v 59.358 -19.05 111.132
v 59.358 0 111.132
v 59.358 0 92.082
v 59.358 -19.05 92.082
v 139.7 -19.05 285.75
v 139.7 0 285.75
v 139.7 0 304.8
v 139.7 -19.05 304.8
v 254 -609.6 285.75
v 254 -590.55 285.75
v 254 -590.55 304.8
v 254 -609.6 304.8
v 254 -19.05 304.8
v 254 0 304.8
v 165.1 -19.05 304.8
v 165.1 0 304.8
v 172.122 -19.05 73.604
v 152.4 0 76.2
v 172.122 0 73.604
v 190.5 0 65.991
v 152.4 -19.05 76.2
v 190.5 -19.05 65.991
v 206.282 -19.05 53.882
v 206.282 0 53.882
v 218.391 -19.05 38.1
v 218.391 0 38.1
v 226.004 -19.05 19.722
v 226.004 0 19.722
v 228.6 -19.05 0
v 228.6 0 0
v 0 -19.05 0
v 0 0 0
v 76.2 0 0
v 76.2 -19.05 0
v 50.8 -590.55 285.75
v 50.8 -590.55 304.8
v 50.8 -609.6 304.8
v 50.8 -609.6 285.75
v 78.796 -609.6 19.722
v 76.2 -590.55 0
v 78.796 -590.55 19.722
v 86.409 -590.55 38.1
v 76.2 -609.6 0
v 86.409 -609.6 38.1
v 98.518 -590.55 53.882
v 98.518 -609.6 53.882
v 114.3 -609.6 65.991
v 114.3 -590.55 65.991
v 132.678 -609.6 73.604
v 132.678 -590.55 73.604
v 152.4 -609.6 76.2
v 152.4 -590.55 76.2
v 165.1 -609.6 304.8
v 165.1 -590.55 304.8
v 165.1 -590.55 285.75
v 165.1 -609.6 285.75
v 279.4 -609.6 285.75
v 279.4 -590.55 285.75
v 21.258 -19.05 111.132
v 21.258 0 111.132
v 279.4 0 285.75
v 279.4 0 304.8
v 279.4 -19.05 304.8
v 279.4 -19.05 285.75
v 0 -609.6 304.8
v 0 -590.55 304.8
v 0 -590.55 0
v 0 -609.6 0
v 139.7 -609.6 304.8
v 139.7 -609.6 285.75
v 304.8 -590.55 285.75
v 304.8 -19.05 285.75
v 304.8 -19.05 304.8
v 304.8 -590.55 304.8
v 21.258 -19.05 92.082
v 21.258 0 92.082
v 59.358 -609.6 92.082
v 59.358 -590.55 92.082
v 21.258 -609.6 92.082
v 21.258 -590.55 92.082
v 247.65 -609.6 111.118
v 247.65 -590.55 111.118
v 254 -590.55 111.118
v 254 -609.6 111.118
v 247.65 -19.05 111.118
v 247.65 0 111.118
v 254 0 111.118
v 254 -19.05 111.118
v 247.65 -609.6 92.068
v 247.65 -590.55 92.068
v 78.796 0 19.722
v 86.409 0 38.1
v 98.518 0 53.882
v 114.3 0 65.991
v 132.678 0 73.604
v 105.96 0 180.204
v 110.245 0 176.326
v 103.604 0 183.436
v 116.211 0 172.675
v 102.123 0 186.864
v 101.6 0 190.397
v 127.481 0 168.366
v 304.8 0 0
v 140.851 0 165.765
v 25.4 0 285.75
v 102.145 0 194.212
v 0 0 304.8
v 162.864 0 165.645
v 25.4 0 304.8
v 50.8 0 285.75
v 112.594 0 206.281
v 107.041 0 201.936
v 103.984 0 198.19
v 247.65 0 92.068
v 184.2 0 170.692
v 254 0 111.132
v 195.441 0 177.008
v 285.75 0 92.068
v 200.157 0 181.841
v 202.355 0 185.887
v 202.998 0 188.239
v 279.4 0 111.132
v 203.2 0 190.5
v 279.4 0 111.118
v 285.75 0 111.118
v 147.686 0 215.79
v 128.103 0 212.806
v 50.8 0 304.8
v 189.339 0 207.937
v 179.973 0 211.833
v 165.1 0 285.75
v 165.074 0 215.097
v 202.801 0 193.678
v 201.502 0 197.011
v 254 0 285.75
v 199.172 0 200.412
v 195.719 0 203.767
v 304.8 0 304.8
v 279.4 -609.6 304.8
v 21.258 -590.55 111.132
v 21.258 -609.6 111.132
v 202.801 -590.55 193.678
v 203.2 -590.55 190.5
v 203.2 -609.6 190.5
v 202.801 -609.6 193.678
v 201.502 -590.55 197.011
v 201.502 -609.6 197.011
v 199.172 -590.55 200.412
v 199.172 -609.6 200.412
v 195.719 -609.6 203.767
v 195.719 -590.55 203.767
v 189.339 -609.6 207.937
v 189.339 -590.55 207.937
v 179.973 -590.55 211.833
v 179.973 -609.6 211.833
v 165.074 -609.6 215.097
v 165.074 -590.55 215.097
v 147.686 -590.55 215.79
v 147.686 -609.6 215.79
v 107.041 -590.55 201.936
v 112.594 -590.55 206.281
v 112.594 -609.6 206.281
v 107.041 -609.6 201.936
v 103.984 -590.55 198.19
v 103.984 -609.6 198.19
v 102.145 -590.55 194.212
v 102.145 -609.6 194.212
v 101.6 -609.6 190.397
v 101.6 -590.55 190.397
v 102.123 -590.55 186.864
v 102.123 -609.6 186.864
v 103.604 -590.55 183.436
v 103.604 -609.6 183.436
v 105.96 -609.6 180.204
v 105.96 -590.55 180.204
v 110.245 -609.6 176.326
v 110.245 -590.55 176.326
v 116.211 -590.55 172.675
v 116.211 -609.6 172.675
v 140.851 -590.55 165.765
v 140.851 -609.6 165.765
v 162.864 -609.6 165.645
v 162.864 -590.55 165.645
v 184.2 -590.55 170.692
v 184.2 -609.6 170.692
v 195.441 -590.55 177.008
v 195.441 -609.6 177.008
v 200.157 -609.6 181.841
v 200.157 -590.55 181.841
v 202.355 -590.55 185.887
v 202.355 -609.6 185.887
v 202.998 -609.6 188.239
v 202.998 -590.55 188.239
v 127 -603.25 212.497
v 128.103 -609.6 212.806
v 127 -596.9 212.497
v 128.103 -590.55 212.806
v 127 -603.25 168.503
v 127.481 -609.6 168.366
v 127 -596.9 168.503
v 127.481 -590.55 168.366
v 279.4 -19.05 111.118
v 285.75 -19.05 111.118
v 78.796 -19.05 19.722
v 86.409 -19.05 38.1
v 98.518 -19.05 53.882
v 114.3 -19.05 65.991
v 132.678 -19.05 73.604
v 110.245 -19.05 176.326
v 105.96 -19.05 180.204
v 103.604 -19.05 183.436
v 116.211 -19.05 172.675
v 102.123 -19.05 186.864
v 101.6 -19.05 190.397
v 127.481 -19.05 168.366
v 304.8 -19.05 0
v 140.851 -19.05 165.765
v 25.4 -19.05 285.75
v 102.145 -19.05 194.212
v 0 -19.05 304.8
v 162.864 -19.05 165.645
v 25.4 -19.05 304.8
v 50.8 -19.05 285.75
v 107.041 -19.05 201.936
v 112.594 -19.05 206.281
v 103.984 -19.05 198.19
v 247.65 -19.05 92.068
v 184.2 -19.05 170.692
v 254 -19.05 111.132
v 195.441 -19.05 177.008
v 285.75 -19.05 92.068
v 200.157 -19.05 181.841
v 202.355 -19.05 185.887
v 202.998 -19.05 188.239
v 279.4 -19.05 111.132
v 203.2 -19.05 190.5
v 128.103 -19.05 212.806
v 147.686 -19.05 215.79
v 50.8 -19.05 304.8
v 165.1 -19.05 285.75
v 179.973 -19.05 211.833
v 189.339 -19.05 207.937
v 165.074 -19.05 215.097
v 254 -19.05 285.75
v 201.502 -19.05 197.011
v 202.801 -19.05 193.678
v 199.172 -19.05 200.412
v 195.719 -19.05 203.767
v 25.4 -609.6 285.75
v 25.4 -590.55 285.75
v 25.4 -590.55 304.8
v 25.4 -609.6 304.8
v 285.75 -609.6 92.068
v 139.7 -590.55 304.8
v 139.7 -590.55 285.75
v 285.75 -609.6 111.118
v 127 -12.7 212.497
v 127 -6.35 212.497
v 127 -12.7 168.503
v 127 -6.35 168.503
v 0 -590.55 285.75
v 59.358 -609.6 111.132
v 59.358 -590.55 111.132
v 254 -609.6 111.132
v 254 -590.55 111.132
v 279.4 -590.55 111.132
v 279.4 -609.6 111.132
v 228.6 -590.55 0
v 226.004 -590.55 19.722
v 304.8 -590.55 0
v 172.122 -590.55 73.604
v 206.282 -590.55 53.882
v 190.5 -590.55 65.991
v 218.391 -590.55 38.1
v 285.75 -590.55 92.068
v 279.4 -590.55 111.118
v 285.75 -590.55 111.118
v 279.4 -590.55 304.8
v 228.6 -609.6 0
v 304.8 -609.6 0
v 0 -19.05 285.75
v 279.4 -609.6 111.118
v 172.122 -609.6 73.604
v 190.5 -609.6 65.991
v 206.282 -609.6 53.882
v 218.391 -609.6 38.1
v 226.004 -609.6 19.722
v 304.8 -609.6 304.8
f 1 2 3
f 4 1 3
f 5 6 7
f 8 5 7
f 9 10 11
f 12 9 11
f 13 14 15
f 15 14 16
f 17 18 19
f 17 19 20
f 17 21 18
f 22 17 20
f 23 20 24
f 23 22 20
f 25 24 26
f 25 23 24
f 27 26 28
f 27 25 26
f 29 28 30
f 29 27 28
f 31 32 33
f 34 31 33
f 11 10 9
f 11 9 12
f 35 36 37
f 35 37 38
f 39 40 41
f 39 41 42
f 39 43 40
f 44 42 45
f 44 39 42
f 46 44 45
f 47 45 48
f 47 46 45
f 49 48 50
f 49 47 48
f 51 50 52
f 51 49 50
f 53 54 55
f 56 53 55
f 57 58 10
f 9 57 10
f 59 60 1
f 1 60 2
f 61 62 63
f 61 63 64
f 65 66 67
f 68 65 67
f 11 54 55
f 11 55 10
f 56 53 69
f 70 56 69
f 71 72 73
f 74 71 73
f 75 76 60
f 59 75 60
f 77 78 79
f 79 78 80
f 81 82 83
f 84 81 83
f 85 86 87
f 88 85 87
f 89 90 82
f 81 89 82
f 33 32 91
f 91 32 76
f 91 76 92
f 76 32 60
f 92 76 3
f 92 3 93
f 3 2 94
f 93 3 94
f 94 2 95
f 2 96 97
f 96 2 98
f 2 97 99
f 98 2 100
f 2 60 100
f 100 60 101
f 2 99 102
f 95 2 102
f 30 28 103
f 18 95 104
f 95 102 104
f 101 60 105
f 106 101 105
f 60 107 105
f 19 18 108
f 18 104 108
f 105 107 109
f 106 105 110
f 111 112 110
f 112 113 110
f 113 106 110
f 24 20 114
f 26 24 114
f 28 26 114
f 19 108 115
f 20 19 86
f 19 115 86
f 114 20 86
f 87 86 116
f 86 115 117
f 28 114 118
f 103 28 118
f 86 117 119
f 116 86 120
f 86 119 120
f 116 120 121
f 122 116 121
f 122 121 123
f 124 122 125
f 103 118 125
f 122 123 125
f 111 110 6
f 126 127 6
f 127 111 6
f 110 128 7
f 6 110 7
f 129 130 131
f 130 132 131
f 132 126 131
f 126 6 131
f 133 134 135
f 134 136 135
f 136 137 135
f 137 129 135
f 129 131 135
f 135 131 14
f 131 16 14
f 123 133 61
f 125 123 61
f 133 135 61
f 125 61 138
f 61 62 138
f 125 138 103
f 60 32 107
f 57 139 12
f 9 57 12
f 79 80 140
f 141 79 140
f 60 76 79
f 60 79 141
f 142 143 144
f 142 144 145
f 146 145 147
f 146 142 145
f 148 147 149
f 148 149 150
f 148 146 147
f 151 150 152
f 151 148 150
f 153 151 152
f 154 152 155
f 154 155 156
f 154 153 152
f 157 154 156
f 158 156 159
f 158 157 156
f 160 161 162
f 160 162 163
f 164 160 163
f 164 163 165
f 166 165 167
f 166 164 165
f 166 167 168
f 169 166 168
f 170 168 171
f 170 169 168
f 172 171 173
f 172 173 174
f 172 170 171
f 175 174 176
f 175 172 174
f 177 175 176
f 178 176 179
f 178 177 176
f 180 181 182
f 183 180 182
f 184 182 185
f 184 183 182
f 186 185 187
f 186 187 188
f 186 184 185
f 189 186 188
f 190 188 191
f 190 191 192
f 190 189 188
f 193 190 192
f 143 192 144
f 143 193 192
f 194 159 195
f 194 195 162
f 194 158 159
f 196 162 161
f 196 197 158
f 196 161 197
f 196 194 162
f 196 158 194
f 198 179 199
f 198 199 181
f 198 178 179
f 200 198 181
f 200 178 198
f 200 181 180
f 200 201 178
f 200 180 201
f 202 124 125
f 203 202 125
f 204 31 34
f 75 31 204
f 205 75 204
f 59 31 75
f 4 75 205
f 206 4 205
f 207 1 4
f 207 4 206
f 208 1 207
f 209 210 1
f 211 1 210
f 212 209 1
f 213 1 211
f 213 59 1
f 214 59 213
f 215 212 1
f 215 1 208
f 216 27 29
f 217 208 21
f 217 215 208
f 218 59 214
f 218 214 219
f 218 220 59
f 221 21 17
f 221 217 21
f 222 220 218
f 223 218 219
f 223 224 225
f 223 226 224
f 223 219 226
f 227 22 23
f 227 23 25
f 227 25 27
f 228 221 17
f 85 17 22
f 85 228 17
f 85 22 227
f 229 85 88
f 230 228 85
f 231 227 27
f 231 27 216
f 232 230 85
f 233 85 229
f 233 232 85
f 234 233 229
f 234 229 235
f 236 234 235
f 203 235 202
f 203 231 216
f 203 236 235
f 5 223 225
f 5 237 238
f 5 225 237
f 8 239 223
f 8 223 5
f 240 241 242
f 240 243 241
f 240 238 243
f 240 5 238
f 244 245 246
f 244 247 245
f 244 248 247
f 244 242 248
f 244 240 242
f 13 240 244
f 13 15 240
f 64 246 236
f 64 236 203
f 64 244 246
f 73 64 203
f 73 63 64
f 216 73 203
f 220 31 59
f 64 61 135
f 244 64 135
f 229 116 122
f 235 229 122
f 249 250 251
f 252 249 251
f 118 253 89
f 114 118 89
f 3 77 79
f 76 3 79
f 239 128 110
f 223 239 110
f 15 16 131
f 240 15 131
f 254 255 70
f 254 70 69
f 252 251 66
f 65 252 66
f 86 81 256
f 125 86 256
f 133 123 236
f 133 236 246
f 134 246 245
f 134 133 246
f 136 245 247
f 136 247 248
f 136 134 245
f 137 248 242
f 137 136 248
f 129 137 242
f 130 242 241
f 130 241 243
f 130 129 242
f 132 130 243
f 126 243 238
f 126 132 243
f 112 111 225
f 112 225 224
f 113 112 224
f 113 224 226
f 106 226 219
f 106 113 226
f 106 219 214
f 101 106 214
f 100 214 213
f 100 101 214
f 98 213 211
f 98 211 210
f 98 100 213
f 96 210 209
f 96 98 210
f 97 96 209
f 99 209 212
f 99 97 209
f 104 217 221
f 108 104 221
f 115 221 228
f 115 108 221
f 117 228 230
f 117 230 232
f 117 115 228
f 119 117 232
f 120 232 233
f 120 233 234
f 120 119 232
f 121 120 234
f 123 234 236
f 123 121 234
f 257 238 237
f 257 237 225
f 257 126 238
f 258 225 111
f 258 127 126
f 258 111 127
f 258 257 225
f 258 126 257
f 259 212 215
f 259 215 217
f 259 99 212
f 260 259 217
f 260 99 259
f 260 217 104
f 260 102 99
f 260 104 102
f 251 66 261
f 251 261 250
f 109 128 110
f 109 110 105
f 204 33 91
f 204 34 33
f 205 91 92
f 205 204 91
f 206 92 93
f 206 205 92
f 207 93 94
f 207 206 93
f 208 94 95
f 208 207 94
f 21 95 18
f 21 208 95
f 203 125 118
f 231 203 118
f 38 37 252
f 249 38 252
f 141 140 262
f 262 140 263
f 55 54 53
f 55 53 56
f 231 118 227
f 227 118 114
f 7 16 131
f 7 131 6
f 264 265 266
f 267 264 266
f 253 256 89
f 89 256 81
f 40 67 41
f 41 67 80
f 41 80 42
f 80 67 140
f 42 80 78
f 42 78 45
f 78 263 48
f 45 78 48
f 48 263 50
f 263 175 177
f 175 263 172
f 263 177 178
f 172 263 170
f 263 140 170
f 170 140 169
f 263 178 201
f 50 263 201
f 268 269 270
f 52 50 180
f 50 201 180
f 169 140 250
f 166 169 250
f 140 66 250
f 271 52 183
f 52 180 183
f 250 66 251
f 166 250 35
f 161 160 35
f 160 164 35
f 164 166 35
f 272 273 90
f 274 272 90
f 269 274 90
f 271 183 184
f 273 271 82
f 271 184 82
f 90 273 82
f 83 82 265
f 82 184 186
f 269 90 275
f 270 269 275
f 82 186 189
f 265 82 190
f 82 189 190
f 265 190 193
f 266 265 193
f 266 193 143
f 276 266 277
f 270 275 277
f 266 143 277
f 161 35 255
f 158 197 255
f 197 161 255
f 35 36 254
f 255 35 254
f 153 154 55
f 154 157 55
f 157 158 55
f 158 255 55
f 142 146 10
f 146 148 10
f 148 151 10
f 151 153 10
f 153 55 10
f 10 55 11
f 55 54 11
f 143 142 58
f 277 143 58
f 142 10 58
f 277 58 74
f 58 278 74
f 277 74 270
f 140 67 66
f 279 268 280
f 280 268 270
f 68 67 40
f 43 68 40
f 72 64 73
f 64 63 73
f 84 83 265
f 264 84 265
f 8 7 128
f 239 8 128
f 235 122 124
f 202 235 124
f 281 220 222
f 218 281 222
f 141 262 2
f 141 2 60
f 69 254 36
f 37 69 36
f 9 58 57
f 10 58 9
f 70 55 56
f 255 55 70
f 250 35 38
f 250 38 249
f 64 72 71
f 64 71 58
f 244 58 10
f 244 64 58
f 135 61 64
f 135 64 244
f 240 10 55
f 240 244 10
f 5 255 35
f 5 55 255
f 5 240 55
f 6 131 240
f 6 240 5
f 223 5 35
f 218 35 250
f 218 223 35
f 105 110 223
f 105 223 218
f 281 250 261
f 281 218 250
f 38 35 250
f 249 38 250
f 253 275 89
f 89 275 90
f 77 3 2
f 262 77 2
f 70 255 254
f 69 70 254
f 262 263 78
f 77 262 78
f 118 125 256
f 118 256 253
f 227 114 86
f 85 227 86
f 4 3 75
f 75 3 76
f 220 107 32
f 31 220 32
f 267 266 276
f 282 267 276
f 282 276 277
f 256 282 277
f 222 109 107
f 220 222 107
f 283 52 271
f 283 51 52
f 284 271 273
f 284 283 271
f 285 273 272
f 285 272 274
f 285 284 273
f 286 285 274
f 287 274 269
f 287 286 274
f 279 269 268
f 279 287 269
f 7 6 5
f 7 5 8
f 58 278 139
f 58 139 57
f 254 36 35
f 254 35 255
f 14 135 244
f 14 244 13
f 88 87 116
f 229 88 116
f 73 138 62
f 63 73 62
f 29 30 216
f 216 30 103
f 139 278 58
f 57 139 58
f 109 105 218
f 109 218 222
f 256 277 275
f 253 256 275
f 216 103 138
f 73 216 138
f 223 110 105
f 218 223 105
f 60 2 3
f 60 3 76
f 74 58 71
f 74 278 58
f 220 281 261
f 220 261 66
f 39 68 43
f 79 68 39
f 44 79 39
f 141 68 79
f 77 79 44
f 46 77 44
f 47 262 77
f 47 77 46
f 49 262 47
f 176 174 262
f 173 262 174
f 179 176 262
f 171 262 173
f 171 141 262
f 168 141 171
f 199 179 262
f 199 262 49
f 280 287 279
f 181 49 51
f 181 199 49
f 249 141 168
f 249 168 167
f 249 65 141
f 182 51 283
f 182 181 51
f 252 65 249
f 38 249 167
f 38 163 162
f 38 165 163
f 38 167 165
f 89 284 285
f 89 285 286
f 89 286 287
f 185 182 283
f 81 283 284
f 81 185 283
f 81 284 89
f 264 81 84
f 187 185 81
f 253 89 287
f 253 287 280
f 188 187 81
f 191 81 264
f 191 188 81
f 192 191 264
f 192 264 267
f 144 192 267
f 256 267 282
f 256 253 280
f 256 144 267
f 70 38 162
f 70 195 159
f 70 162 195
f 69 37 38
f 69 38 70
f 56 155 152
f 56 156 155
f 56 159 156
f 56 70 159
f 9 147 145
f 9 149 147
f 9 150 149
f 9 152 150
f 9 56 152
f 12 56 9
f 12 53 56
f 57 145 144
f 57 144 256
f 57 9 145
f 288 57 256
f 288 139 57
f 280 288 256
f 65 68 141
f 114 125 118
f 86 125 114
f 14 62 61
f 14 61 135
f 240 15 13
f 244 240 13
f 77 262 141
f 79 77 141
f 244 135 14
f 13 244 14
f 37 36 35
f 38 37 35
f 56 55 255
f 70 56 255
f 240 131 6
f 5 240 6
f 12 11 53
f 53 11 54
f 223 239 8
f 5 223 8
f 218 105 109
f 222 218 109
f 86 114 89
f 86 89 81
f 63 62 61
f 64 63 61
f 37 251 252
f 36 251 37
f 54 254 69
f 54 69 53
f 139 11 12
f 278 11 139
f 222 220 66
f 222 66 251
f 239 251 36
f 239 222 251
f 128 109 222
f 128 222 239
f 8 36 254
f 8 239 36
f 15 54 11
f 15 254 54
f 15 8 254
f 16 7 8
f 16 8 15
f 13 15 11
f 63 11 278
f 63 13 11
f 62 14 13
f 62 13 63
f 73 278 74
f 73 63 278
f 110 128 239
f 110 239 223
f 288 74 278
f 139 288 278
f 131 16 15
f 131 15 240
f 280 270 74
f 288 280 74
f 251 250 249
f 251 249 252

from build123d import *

# Parameters (mm, degrees)
F1_DEPTH = 19.05
F2_W     = 25.4
F2_H     = 19.05
F2_W_2   = 88.9
F3_DEPTH = 609.6
F2_W_3   = 38.1
F5_R     = 76.19999
F5_2_R   = 76.19999


# Not quite as in the source:
# - a fillet or chamfer is up to 0.001 mm smaller than in the source, because OpenCascade refuses the exact size


with BuildPart() as f1:
    # F0 (on Front) → F1 (new body)
    with BuildSketch(Plane.XZ):
        Polygon((0, 304.8), (0, 0), (76.2, 0), (76.2, 76.2), (228.6, 76.2), (228.6, 0), (304.8, 0), (304.8, 304.8), (279.4, 304.8), (279.4, 285.75), (254, 285.75), (254, 304.8), (165.1, 304.8), (165.1, 285.75), (139.7, 285.75), (139.7, 304.8), (50.8, 304.8), (50.8, 285.75), (25.4, 285.75), (25.4, 304.8), align=None)
        Polygon((59.3576016784, 92.0819193125), (53.0076016784, 92.0819193125), (27.6076016784, 92.0819193125), (25.4, 92.0819193125), (21.2576016784, 92.0819193125), (21.2576016784, 111.1319193125), (27.6076016784, 111.1319193125), (53.0076016784, 111.1319193125), (59.3576016784, 111.1319193125), align=None, mode=Mode.SUBTRACT)
        Polygon((254, 111.1180806875), (254, 111.1319193125), (279.4, 111.1319193125), (279.4, 111.1180806875), (285.75, 111.1180806875), (285.75, 92.0680806875), (279.4, 92.0680806875), (254, 92.0680806875), (247.65, 92.0680806875), (247.65, 111.1180806875), align=None, mode=Mode.SUBTRACT)
        with BuildLine():
            add(Edge.make_bspline(
                [(203.2, 190.5), (203.2, 234.4940905122), (127, 212.4970452561), (50.8, 190.5), (127, 168.5029547439), (203.2, 146.5059094878), (203.2, 190.5)],
                knots=[0, 0, 0, 2.0943951024, 2.0943951024, 4.1887902048, 4.1887902048, 6.2831853072, 6.2831853072, 6.2831853072], degree=2, weights=[1, 0.5, 1, 0.5, 1, 0.5, 1]))
        make_face(mode=Mode.SUBTRACT)
    extrude(amount=F1_DEPTH)


with BuildPart() as f3:
    # F2 (on face) → F3 (new body)
    with BuildSketch(Plane(origin=(0, 0, 0), x_dir=(-1, 0, 0), z_dir=(0, 1, 0))):
        with Locations((-292.1, 295.275)):
            Rectangle(F2_W, F2_H)
        with Locations((-266.7, 295.275)):
            Rectangle(F2_W, F2_H)
        with Locations((-209.55, 295.275)):
            Rectangle(F2_W_2, F2_H)
        with Locations((-152.4, 295.275)):
            Rectangle(F2_W, F2_H)
        with Locations((-95.25, 295.275)):
            Rectangle(F2_W_2, F2_H)
        with Locations((-38.1, 295.275)):
            Rectangle(F2_W, F2_H)
        with Locations((-12.7, 295.275)):
            Rectangle(F2_W, F2_H)
    extrude(amount=-F3_DEPTH)


with BuildPart() as f3b:
    # F2 (on face) → F3, piece 2 (new body)
    with BuildSketch(Plane(origin=(0, 0, 0), x_dir=(-1, 0, 0), z_dir=(0, 1, 0))):
        with Locations((-40.3076016784, 101.6069193125)):
            Rectangle(F2_W_3, F2_H)
    extrude(amount=-F3_DEPTH)


with BuildPart() as f3c:
    # F2 (on face) → F3, piece 3 (new body)
    with BuildSketch(Plane(origin=(0, 0, 0), x_dir=(-1, 0, 0), z_dir=(0, 1, 0))):
        Polygon((-247.65, 92.0680806875), (-247.65, 111.1180806875), (-254, 111.1180806875), (-279.4, 111.1180806875), (-285.75, 111.1180806875), (-285.75, 92.0680806875), align=None)
    extrude(amount=-F3_DEPTH)


with BuildPart() as f4_1:
    # F4: copy of F1
    add(f1.part.moved(Location((0, -590.55, 0))))

    # F5#2 (radius 76.2 in the source; OpenCascade refuses exactly that, so slightly less here)
    f5_2_edges = [f4_1.edges().sort_by_distance(p)[0] for p in [
        (228.6, -600.075, 76.2),
        (76.2, -600.075, 76.2),
    ]]
    fillet(f5_2_edges, radius=F5_2_R)


with BuildPart() as f1_1:
    add(f1.part)

    # F5 (radius 76.2 in the source; OpenCascade refuses exactly that, so slightly less here)
    f5_edges = [f1_1.edges().sort_by_distance(p)[0] for p in [
        (76.2, -9.525, 76.2),
        (228.6, -9.525, 76.2),
    ]]
    fillet(f5_edges, radius=F5_R)


with BuildPart() as f3_1:
    add(f3.part)

    # F6: cut F4_1
    add(f4_1.part, mode=Mode.SUBTRACT)

    # F7: cut F1
    add(f1_1.part, mode=Mode.SUBTRACT)


solid = Compound([f3b.part, f3c.part, f4_1.part, f1_1.part, f3_1.part])
